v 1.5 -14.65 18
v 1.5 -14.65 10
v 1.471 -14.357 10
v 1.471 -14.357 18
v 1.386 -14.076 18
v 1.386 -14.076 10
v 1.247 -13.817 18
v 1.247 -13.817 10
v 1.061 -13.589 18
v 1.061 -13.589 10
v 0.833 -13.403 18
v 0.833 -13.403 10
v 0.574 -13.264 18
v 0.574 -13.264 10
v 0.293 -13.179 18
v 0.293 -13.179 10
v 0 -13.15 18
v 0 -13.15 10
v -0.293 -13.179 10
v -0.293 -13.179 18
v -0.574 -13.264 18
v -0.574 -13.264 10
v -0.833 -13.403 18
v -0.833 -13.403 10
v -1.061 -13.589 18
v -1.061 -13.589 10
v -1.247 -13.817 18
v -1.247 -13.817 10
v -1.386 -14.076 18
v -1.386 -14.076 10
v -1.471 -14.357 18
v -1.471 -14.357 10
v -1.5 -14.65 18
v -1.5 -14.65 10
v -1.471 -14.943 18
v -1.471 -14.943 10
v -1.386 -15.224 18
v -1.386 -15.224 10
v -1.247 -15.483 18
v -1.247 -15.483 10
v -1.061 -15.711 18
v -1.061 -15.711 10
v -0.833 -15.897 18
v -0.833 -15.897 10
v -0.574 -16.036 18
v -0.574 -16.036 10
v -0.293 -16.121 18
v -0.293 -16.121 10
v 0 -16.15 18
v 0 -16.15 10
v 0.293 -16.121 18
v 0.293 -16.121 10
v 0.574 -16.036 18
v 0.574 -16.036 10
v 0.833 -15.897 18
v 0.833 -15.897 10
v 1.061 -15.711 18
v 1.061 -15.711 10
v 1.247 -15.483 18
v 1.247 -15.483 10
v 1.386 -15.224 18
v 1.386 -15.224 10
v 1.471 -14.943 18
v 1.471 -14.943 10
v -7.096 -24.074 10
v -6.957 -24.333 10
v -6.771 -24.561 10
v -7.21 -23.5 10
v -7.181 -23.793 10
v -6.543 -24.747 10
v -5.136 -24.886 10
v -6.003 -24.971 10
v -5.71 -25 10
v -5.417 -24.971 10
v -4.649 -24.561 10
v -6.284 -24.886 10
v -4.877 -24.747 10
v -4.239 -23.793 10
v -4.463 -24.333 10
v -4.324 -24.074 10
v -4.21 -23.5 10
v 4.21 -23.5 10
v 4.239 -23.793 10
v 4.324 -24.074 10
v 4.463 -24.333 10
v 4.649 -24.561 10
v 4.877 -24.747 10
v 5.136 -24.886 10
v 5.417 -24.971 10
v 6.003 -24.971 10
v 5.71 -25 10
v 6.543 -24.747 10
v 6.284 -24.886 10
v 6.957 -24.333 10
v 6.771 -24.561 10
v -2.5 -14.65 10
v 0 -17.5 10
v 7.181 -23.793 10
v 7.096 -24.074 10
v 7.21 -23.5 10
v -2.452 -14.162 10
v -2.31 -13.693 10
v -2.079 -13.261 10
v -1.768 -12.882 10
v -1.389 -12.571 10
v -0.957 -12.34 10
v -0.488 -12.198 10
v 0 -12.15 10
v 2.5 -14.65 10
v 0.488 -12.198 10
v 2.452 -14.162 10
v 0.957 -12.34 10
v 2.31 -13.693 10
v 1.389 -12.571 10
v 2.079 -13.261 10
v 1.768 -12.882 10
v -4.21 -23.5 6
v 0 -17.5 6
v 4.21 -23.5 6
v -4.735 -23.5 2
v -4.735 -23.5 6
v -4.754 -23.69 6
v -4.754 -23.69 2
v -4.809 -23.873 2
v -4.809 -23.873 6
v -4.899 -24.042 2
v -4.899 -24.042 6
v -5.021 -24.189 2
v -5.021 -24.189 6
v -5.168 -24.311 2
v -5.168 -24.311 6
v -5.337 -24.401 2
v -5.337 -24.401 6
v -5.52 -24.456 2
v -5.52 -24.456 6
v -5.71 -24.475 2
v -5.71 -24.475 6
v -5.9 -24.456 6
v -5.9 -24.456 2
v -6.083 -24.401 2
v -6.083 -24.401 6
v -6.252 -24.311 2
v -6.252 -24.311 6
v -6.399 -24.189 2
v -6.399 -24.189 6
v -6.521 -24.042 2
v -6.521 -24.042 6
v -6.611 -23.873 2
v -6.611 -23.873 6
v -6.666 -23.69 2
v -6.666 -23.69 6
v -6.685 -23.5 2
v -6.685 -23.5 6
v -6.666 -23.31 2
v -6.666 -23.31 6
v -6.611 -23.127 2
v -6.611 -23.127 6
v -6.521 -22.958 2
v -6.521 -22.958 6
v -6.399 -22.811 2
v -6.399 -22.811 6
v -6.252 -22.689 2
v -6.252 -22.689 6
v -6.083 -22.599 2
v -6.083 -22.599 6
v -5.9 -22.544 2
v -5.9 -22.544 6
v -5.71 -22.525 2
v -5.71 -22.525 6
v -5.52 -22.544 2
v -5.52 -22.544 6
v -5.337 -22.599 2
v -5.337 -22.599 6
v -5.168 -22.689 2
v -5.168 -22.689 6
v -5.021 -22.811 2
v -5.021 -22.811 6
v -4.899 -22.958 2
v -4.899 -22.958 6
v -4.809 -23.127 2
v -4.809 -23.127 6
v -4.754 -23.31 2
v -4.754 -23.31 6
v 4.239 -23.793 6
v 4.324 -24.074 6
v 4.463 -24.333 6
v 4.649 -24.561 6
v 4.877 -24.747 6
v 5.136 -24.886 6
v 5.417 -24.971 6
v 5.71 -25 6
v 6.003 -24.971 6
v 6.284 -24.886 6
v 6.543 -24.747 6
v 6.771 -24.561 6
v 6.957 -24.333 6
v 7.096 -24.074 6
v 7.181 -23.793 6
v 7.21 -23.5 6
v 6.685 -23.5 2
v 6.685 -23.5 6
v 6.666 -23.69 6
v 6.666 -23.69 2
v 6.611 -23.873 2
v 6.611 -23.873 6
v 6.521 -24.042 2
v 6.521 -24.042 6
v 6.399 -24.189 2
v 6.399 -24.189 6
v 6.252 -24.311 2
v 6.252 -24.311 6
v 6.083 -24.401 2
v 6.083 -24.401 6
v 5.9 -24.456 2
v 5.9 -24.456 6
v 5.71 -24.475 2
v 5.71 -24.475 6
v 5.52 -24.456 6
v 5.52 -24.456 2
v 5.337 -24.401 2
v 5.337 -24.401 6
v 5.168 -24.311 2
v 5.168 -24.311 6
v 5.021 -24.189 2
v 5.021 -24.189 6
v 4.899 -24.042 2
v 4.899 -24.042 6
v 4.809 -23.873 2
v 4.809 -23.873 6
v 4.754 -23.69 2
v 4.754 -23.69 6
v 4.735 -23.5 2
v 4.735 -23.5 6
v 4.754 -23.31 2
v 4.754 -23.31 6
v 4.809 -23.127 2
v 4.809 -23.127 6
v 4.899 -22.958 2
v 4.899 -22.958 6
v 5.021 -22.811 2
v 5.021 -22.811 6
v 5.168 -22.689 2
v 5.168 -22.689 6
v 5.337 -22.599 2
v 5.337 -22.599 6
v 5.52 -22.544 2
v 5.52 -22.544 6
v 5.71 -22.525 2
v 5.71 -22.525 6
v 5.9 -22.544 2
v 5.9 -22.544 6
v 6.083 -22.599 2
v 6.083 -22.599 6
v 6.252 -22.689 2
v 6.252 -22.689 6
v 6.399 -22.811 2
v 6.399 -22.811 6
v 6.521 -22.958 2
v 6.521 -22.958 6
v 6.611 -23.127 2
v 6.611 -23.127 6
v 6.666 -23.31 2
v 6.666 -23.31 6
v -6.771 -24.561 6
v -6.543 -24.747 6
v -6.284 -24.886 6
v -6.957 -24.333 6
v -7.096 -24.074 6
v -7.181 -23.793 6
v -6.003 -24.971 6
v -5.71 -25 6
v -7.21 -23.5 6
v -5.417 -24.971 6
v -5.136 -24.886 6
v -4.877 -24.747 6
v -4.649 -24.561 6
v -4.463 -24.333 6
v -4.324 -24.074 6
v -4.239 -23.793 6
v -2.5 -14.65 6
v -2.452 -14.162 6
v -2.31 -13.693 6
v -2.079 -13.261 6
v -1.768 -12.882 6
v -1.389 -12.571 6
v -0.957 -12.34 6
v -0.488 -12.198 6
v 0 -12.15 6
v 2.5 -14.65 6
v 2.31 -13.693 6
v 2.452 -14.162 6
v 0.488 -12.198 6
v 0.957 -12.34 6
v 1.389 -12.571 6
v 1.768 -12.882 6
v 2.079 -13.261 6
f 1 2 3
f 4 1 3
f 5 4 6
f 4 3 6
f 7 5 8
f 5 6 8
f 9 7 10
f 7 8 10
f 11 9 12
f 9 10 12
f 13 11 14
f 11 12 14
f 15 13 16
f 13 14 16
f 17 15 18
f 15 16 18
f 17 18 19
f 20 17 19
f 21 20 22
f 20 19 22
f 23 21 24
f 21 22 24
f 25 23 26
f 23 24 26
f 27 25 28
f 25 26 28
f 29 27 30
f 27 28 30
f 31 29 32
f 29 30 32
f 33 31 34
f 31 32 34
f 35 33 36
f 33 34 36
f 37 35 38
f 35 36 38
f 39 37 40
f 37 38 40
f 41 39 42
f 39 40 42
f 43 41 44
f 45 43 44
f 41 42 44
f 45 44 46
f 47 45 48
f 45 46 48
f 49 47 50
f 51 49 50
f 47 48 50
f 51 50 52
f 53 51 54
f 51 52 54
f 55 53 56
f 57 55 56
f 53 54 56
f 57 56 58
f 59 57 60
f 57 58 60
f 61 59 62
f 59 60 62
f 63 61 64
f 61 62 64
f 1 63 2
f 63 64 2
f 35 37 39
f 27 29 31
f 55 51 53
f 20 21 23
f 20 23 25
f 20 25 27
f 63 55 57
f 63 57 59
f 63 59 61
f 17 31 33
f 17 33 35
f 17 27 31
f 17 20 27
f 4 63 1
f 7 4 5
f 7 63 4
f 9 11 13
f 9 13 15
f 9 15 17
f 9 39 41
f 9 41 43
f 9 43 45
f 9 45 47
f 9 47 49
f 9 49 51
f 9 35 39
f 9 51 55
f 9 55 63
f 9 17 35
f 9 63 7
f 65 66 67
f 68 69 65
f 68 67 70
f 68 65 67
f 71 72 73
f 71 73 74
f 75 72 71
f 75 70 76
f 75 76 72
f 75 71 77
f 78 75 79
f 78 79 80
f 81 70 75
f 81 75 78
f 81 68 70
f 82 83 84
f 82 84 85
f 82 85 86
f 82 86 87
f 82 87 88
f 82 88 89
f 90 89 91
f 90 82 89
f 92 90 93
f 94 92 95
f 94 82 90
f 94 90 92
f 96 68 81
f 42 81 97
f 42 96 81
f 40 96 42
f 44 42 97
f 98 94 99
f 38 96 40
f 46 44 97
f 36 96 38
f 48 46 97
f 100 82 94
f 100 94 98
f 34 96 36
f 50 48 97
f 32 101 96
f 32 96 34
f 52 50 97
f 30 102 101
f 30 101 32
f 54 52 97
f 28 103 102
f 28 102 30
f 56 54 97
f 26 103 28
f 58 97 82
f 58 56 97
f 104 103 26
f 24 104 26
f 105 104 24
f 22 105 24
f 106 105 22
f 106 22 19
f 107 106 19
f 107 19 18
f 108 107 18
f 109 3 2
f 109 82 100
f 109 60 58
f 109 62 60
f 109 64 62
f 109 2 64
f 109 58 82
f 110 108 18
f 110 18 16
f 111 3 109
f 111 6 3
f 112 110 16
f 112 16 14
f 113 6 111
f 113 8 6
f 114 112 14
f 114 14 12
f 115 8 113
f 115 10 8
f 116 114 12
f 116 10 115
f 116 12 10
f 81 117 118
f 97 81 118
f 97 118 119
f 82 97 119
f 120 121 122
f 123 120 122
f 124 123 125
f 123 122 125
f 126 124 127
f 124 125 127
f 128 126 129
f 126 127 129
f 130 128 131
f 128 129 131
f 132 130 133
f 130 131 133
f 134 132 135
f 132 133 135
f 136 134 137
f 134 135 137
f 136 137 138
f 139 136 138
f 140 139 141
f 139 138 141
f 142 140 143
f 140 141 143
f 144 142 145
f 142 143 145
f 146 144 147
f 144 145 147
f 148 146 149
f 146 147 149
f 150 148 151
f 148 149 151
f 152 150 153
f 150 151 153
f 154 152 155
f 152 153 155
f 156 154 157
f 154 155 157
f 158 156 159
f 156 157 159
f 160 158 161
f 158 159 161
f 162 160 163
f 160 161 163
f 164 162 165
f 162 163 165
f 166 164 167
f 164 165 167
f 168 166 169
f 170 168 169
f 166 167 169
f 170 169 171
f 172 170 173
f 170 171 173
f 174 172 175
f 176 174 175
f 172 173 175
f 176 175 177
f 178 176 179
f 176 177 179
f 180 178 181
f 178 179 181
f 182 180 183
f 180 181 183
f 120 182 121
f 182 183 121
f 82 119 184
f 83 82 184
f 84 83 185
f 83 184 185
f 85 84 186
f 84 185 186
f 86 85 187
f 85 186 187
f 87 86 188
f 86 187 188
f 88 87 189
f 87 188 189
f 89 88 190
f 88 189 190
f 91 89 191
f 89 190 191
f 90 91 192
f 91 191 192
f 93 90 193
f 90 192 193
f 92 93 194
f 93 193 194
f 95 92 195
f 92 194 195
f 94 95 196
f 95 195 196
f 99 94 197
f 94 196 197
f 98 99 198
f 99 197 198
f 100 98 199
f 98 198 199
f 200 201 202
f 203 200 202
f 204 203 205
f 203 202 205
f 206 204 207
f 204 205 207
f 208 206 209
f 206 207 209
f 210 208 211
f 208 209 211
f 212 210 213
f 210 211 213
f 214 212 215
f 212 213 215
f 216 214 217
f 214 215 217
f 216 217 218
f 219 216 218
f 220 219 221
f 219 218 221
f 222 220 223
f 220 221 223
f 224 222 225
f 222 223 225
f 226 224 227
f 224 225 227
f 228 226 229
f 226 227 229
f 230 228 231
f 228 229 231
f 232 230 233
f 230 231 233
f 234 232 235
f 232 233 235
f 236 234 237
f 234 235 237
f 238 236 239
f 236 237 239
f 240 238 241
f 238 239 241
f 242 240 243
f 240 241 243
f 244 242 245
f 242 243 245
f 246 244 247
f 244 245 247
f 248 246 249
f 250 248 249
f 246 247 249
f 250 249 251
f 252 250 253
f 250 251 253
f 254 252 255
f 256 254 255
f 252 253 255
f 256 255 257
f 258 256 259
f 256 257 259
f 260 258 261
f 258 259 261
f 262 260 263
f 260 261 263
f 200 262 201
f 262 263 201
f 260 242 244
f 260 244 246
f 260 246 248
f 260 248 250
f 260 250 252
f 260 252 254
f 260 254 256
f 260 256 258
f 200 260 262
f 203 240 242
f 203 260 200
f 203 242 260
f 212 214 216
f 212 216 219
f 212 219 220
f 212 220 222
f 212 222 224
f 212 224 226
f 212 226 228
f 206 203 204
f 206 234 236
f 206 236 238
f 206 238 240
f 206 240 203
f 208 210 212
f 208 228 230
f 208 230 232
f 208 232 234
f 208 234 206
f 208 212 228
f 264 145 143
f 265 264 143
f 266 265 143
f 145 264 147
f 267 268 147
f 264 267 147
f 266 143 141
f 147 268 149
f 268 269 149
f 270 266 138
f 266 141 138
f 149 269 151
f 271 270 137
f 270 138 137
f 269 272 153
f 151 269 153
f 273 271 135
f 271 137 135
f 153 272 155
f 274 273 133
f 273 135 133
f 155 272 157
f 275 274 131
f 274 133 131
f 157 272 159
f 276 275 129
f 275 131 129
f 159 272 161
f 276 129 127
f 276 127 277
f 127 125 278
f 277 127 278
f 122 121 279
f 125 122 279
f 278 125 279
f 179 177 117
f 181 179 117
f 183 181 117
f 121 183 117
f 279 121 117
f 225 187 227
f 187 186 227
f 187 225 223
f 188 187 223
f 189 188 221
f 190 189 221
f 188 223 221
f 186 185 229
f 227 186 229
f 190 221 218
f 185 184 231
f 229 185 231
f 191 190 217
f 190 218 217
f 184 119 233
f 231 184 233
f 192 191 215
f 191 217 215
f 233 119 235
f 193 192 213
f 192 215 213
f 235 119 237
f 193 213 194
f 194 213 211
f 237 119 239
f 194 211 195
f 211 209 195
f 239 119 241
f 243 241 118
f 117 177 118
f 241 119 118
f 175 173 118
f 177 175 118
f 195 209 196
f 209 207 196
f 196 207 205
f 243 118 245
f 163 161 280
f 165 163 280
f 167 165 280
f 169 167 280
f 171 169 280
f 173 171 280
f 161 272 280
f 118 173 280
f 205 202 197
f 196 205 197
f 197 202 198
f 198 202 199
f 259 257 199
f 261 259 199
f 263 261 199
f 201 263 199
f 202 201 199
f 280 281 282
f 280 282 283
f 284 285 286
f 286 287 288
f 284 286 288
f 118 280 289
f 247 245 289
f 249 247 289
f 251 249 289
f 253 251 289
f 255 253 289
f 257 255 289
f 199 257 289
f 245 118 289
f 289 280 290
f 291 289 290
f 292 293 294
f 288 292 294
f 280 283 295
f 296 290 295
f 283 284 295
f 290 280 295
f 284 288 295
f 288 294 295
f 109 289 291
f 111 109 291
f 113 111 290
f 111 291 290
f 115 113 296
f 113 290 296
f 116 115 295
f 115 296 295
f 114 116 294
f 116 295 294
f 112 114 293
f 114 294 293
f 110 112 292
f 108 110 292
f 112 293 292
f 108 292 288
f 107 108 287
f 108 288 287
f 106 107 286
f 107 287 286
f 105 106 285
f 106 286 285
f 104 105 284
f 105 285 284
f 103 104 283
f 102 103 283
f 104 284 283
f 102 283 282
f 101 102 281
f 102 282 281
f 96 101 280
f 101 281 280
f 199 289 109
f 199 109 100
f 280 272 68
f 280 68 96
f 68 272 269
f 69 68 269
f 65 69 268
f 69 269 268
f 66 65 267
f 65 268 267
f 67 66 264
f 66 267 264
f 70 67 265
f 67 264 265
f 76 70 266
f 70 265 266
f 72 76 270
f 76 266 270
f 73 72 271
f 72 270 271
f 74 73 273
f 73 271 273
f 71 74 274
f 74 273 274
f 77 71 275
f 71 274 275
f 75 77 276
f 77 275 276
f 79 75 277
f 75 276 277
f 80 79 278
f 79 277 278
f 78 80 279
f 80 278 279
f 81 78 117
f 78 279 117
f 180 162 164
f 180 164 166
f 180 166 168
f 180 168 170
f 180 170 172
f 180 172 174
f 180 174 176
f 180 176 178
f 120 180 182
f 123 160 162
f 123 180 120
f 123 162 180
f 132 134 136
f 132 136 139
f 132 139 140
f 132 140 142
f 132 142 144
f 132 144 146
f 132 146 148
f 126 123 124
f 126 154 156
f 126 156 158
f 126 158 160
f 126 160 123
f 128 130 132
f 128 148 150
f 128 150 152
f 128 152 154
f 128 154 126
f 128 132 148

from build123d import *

# Parameters (mm, degrees)
PAD011_DEPTH = 4
SKETCH025_R  = 1.5
PAD012_DEPTH = 8
SKETCH026_R  = 0.975
PAD013_DEPTH = 4


with BuildPart() as part:
    # Sketch024 → Pad011 (new body)
    with BuildSketch(Plane.XY):
        with BuildLine():
            ThreePointArc((4.21, 0), (5.71, -1.5), (7.21, 0))
            Line((2.5, 8.850012), (7.21, 0))
            ThreePointArc((2.5, 8.850012), (0, 11.35), (-2.5, 8.850012))
            Line((-7.21, 0), (-2.5, 8.850012))
            ThreePointArc((-7.21, 0), (-5.71, -1.5), (-4.21, 0))
            Line((-4.21, 0), (0, 6))
            Line((0, 6), (4.21, 0))
        make_face()
    extrude(amount=PAD011_DEPTH)

    # Sketch025 (on Face9 of Pad011) → Pad012 (join)
    with BuildSketch(Plane.XY.offset(4)):
        with Locations((0, 8.85)):
            Circle(SKETCH025_R)
    extrude(amount=PAD012_DEPTH)

    # Sketch026 (on Face4 of Pad012) → Pad013 (join)
    with BuildSketch(Plane(origin=(0, 0, 0), x_dir=(1, 0, 0), z_dir=(0, 0, -1))):
        with Locations((-5.71, 0)):
            Circle(SKETCH026_R)
        with Locations((5.71, 0)):
            Circle(SKETCH026_R)
    extrude(amount=PAD013_DEPTH)


with BuildPart() as part_1:
    # Body004 placement: moved
    add(part.part.moved(Location((0, -23.5, 6))))


solid = part_1.part
